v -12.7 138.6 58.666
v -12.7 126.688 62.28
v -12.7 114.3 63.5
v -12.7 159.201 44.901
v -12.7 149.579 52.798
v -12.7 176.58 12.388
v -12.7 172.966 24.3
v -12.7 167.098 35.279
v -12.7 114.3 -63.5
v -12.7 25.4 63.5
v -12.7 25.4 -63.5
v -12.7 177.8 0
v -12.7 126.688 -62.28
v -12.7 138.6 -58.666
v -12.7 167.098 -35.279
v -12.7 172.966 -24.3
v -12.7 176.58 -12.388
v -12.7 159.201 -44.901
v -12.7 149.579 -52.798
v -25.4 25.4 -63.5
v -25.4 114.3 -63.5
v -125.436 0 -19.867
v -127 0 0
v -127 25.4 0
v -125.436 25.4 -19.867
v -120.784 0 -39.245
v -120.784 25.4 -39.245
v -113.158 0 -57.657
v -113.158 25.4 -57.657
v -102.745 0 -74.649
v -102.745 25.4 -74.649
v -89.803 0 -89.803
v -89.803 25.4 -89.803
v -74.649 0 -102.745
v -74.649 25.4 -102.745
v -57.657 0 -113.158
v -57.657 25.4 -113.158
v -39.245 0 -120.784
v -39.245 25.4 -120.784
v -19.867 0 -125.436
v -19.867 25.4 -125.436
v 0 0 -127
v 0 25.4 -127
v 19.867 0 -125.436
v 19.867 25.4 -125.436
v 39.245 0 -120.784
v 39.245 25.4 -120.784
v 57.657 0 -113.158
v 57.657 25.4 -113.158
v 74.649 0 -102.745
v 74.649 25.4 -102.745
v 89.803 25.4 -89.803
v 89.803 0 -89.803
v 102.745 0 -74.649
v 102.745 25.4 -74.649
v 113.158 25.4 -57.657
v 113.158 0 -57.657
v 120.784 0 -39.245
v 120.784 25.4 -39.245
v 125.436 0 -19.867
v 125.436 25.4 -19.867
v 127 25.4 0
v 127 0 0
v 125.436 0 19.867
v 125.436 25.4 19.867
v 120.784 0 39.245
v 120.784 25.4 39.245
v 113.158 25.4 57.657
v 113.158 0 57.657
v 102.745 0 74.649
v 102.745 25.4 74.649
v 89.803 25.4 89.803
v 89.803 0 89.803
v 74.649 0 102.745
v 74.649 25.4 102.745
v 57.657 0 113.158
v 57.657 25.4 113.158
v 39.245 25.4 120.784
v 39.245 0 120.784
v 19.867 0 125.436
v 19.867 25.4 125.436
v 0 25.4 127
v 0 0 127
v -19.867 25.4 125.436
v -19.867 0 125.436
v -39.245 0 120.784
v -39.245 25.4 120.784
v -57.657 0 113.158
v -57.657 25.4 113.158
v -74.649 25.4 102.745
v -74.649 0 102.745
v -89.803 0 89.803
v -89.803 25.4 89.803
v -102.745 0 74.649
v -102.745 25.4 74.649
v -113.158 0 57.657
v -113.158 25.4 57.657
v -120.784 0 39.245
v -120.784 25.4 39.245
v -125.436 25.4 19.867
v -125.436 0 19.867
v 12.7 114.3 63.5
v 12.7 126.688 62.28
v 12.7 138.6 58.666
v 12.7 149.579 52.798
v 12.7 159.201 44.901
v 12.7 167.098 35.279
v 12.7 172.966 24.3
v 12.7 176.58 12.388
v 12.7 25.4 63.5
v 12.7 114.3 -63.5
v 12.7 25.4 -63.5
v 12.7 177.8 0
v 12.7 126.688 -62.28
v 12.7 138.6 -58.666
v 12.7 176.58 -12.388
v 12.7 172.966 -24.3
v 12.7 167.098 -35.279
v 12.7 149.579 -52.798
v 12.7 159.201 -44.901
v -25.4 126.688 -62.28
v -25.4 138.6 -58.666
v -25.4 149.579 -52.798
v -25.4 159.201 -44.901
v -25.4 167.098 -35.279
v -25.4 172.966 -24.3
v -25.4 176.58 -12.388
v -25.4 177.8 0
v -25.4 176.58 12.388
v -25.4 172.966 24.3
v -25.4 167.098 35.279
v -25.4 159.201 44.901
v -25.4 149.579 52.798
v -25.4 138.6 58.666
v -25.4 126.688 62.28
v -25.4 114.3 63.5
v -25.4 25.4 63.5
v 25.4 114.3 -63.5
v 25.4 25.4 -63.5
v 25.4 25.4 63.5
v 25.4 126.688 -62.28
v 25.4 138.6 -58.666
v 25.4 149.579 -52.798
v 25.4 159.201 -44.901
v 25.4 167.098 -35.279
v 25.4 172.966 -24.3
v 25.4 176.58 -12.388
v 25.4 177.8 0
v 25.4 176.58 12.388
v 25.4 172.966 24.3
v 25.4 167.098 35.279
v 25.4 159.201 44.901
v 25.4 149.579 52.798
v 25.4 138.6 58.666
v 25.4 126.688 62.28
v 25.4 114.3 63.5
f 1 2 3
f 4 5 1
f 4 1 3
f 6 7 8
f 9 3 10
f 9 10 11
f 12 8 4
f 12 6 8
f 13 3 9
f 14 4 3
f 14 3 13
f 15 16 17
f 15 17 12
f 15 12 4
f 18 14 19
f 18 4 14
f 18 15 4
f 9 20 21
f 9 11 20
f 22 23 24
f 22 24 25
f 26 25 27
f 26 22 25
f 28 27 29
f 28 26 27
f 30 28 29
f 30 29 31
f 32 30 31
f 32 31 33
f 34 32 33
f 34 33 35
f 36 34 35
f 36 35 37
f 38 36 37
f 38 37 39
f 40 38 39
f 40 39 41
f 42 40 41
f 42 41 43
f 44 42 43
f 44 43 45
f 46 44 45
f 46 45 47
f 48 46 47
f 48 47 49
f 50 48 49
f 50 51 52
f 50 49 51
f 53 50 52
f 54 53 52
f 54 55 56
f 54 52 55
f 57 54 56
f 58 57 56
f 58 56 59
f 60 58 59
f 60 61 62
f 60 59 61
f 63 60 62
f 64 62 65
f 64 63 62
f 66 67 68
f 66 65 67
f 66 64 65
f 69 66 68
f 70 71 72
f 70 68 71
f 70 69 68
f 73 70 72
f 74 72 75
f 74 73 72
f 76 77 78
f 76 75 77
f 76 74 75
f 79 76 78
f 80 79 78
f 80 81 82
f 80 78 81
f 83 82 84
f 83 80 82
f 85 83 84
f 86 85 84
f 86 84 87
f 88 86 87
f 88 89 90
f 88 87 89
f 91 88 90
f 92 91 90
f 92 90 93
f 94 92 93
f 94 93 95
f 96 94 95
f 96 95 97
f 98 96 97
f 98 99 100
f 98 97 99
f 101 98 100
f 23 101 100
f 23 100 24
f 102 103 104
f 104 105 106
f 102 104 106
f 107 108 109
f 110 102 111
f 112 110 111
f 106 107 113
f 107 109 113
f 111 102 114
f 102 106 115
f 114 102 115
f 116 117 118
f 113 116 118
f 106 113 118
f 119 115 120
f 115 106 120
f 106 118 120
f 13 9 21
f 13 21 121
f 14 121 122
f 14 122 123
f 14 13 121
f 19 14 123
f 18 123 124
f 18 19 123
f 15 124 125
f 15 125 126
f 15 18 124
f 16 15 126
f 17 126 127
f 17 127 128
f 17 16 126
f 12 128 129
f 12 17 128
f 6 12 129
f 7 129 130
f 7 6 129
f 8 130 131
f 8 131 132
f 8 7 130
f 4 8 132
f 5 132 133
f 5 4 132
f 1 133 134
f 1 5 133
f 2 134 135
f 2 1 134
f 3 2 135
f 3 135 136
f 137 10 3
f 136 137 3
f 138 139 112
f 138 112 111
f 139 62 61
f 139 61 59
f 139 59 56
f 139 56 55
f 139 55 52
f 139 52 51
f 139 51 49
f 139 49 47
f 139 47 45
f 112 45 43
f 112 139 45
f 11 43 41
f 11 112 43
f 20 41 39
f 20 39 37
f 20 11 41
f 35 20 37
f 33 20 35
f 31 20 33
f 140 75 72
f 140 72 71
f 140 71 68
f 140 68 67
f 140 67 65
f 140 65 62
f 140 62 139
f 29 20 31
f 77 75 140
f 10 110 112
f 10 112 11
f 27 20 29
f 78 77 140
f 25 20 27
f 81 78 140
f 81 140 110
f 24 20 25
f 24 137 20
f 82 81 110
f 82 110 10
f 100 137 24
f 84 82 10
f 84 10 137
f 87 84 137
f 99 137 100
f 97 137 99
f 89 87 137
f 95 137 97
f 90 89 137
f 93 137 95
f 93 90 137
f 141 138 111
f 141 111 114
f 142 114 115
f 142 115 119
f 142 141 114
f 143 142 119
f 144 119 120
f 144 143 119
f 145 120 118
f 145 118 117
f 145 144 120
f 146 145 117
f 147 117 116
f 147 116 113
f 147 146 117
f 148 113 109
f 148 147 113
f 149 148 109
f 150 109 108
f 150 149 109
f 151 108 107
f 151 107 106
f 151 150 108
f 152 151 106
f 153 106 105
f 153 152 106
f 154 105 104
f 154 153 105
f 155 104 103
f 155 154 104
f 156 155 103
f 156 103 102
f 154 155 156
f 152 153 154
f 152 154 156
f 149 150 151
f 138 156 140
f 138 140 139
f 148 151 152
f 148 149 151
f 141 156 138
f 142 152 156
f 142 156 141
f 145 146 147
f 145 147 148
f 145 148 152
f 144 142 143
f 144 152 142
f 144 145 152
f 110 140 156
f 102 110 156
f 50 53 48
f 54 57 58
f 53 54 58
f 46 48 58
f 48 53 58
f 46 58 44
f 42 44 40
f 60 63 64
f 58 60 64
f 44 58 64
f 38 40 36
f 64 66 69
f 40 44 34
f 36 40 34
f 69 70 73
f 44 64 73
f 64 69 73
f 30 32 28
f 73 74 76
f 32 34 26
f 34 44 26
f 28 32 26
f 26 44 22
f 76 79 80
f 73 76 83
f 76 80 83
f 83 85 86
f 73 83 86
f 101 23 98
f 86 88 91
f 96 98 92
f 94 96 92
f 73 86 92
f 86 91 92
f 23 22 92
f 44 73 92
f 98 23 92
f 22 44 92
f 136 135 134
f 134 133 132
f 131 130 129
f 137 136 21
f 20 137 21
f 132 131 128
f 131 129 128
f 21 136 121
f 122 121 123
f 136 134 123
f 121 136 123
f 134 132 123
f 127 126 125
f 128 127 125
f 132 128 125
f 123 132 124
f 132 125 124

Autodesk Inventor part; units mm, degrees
ref_plane "YZ Plane" through (0, 0, 0) normal (1, 0, 0) x (0, 1, 0)
ref_plane "XZ Plane" through (0, 0, 0) normal (0, 1, 0) x (-1, 0, 0)
ref_plane "XY Plane" through (0, 0, 0) normal (0, 0, 1) x (1, 0, 0)
sketch "Sketch1" plane through (0, 0, 0) normal (0, 1, 0) x (-1, 0, 0)
  circle A0 centre (0, 0) radius 127
  dimension "swivelBaseDiameter" = 254
extrude "Extrusion1" add sketch "Sketch1" along normal blind 25.4
sketch "Sketch2" plane through (0, 25.4, 0) normal (0, 1, 0) x (1, 0, 0)
  circle A0 centre (0, 0) radius 127 construction
  line L0 (0, -127) -> (0, 127) construction
  line L1 (-25.4, 63.5) -> (-12.7, 63.5)
  line L2 (-12.7, 63.5) -> (-12.7, -63.5)
  line L3 (-12.7, -63.5) -> (-25.4, -63.5)
  line L4 (-25.4, -63.5) -> (-25.4, 63.5)
  line L5 (-127, 0) -> (127, 0) construction
  line L6 (25.4, 63.5) -> (12.7, 63.5)
  line L7 (12.7, 63.5) -> (12.7, -63.5)
  line L8 (12.7, -63.5) -> (25.4, -63.5)
  line L9 (25.4, -63.5) -> (25.4, 63.5)
  point P0 (-12.7, 0)
  point P1 (12.7, 0)
  dimension "armConnectorSeparation" = 12.7
  dimension "armConnectorsThickness" = 12.7
  dimension "armConnectorsSize" = 127
extrude "Extrusion2" add sketch "Sketch2" along normal blind 25.4
sketch "Sketch3" plane through (25.4, 25.4, 63.5) normal (1, 0, 0) x (0, 0, -1)
  circle A0 centre (63.5, 88.9) radius 63.5 construction
  line L0 (127, 25.4) -> (127, 88.9)
  line L1 (0, 25.4) -> (0, 88.9)
  arc A1 (127, 88.9) -> (0, 88.9) centre (63.5, 88.9) ccw
  line L2 (0, 25.4) -> (127, 25.4)
  point P0 (63.5, 25.4)
  dimension "d9" = 127
extrude "Extrusion3" add sketch "Sketch3" against normal up to surface (12.7 mm away)
extrude "Extrusion4" add sketch "Sketch3" against normal up to surface (12.7 mm away) from surface at -38.1
equation "\"armConnectorSeparation\" = 0.5 * armThickness"
equation "\"armConnectorsSize\" = majorDiameter"
equation "\"d9\" = armConnectorsSize"
equation "\"d10\" = armConnectorsSize"
equation "\"armThickness\" = 25.4"
equation "\"majorDiameter\" = 127"
properties part number "Base-Arm Connector"
